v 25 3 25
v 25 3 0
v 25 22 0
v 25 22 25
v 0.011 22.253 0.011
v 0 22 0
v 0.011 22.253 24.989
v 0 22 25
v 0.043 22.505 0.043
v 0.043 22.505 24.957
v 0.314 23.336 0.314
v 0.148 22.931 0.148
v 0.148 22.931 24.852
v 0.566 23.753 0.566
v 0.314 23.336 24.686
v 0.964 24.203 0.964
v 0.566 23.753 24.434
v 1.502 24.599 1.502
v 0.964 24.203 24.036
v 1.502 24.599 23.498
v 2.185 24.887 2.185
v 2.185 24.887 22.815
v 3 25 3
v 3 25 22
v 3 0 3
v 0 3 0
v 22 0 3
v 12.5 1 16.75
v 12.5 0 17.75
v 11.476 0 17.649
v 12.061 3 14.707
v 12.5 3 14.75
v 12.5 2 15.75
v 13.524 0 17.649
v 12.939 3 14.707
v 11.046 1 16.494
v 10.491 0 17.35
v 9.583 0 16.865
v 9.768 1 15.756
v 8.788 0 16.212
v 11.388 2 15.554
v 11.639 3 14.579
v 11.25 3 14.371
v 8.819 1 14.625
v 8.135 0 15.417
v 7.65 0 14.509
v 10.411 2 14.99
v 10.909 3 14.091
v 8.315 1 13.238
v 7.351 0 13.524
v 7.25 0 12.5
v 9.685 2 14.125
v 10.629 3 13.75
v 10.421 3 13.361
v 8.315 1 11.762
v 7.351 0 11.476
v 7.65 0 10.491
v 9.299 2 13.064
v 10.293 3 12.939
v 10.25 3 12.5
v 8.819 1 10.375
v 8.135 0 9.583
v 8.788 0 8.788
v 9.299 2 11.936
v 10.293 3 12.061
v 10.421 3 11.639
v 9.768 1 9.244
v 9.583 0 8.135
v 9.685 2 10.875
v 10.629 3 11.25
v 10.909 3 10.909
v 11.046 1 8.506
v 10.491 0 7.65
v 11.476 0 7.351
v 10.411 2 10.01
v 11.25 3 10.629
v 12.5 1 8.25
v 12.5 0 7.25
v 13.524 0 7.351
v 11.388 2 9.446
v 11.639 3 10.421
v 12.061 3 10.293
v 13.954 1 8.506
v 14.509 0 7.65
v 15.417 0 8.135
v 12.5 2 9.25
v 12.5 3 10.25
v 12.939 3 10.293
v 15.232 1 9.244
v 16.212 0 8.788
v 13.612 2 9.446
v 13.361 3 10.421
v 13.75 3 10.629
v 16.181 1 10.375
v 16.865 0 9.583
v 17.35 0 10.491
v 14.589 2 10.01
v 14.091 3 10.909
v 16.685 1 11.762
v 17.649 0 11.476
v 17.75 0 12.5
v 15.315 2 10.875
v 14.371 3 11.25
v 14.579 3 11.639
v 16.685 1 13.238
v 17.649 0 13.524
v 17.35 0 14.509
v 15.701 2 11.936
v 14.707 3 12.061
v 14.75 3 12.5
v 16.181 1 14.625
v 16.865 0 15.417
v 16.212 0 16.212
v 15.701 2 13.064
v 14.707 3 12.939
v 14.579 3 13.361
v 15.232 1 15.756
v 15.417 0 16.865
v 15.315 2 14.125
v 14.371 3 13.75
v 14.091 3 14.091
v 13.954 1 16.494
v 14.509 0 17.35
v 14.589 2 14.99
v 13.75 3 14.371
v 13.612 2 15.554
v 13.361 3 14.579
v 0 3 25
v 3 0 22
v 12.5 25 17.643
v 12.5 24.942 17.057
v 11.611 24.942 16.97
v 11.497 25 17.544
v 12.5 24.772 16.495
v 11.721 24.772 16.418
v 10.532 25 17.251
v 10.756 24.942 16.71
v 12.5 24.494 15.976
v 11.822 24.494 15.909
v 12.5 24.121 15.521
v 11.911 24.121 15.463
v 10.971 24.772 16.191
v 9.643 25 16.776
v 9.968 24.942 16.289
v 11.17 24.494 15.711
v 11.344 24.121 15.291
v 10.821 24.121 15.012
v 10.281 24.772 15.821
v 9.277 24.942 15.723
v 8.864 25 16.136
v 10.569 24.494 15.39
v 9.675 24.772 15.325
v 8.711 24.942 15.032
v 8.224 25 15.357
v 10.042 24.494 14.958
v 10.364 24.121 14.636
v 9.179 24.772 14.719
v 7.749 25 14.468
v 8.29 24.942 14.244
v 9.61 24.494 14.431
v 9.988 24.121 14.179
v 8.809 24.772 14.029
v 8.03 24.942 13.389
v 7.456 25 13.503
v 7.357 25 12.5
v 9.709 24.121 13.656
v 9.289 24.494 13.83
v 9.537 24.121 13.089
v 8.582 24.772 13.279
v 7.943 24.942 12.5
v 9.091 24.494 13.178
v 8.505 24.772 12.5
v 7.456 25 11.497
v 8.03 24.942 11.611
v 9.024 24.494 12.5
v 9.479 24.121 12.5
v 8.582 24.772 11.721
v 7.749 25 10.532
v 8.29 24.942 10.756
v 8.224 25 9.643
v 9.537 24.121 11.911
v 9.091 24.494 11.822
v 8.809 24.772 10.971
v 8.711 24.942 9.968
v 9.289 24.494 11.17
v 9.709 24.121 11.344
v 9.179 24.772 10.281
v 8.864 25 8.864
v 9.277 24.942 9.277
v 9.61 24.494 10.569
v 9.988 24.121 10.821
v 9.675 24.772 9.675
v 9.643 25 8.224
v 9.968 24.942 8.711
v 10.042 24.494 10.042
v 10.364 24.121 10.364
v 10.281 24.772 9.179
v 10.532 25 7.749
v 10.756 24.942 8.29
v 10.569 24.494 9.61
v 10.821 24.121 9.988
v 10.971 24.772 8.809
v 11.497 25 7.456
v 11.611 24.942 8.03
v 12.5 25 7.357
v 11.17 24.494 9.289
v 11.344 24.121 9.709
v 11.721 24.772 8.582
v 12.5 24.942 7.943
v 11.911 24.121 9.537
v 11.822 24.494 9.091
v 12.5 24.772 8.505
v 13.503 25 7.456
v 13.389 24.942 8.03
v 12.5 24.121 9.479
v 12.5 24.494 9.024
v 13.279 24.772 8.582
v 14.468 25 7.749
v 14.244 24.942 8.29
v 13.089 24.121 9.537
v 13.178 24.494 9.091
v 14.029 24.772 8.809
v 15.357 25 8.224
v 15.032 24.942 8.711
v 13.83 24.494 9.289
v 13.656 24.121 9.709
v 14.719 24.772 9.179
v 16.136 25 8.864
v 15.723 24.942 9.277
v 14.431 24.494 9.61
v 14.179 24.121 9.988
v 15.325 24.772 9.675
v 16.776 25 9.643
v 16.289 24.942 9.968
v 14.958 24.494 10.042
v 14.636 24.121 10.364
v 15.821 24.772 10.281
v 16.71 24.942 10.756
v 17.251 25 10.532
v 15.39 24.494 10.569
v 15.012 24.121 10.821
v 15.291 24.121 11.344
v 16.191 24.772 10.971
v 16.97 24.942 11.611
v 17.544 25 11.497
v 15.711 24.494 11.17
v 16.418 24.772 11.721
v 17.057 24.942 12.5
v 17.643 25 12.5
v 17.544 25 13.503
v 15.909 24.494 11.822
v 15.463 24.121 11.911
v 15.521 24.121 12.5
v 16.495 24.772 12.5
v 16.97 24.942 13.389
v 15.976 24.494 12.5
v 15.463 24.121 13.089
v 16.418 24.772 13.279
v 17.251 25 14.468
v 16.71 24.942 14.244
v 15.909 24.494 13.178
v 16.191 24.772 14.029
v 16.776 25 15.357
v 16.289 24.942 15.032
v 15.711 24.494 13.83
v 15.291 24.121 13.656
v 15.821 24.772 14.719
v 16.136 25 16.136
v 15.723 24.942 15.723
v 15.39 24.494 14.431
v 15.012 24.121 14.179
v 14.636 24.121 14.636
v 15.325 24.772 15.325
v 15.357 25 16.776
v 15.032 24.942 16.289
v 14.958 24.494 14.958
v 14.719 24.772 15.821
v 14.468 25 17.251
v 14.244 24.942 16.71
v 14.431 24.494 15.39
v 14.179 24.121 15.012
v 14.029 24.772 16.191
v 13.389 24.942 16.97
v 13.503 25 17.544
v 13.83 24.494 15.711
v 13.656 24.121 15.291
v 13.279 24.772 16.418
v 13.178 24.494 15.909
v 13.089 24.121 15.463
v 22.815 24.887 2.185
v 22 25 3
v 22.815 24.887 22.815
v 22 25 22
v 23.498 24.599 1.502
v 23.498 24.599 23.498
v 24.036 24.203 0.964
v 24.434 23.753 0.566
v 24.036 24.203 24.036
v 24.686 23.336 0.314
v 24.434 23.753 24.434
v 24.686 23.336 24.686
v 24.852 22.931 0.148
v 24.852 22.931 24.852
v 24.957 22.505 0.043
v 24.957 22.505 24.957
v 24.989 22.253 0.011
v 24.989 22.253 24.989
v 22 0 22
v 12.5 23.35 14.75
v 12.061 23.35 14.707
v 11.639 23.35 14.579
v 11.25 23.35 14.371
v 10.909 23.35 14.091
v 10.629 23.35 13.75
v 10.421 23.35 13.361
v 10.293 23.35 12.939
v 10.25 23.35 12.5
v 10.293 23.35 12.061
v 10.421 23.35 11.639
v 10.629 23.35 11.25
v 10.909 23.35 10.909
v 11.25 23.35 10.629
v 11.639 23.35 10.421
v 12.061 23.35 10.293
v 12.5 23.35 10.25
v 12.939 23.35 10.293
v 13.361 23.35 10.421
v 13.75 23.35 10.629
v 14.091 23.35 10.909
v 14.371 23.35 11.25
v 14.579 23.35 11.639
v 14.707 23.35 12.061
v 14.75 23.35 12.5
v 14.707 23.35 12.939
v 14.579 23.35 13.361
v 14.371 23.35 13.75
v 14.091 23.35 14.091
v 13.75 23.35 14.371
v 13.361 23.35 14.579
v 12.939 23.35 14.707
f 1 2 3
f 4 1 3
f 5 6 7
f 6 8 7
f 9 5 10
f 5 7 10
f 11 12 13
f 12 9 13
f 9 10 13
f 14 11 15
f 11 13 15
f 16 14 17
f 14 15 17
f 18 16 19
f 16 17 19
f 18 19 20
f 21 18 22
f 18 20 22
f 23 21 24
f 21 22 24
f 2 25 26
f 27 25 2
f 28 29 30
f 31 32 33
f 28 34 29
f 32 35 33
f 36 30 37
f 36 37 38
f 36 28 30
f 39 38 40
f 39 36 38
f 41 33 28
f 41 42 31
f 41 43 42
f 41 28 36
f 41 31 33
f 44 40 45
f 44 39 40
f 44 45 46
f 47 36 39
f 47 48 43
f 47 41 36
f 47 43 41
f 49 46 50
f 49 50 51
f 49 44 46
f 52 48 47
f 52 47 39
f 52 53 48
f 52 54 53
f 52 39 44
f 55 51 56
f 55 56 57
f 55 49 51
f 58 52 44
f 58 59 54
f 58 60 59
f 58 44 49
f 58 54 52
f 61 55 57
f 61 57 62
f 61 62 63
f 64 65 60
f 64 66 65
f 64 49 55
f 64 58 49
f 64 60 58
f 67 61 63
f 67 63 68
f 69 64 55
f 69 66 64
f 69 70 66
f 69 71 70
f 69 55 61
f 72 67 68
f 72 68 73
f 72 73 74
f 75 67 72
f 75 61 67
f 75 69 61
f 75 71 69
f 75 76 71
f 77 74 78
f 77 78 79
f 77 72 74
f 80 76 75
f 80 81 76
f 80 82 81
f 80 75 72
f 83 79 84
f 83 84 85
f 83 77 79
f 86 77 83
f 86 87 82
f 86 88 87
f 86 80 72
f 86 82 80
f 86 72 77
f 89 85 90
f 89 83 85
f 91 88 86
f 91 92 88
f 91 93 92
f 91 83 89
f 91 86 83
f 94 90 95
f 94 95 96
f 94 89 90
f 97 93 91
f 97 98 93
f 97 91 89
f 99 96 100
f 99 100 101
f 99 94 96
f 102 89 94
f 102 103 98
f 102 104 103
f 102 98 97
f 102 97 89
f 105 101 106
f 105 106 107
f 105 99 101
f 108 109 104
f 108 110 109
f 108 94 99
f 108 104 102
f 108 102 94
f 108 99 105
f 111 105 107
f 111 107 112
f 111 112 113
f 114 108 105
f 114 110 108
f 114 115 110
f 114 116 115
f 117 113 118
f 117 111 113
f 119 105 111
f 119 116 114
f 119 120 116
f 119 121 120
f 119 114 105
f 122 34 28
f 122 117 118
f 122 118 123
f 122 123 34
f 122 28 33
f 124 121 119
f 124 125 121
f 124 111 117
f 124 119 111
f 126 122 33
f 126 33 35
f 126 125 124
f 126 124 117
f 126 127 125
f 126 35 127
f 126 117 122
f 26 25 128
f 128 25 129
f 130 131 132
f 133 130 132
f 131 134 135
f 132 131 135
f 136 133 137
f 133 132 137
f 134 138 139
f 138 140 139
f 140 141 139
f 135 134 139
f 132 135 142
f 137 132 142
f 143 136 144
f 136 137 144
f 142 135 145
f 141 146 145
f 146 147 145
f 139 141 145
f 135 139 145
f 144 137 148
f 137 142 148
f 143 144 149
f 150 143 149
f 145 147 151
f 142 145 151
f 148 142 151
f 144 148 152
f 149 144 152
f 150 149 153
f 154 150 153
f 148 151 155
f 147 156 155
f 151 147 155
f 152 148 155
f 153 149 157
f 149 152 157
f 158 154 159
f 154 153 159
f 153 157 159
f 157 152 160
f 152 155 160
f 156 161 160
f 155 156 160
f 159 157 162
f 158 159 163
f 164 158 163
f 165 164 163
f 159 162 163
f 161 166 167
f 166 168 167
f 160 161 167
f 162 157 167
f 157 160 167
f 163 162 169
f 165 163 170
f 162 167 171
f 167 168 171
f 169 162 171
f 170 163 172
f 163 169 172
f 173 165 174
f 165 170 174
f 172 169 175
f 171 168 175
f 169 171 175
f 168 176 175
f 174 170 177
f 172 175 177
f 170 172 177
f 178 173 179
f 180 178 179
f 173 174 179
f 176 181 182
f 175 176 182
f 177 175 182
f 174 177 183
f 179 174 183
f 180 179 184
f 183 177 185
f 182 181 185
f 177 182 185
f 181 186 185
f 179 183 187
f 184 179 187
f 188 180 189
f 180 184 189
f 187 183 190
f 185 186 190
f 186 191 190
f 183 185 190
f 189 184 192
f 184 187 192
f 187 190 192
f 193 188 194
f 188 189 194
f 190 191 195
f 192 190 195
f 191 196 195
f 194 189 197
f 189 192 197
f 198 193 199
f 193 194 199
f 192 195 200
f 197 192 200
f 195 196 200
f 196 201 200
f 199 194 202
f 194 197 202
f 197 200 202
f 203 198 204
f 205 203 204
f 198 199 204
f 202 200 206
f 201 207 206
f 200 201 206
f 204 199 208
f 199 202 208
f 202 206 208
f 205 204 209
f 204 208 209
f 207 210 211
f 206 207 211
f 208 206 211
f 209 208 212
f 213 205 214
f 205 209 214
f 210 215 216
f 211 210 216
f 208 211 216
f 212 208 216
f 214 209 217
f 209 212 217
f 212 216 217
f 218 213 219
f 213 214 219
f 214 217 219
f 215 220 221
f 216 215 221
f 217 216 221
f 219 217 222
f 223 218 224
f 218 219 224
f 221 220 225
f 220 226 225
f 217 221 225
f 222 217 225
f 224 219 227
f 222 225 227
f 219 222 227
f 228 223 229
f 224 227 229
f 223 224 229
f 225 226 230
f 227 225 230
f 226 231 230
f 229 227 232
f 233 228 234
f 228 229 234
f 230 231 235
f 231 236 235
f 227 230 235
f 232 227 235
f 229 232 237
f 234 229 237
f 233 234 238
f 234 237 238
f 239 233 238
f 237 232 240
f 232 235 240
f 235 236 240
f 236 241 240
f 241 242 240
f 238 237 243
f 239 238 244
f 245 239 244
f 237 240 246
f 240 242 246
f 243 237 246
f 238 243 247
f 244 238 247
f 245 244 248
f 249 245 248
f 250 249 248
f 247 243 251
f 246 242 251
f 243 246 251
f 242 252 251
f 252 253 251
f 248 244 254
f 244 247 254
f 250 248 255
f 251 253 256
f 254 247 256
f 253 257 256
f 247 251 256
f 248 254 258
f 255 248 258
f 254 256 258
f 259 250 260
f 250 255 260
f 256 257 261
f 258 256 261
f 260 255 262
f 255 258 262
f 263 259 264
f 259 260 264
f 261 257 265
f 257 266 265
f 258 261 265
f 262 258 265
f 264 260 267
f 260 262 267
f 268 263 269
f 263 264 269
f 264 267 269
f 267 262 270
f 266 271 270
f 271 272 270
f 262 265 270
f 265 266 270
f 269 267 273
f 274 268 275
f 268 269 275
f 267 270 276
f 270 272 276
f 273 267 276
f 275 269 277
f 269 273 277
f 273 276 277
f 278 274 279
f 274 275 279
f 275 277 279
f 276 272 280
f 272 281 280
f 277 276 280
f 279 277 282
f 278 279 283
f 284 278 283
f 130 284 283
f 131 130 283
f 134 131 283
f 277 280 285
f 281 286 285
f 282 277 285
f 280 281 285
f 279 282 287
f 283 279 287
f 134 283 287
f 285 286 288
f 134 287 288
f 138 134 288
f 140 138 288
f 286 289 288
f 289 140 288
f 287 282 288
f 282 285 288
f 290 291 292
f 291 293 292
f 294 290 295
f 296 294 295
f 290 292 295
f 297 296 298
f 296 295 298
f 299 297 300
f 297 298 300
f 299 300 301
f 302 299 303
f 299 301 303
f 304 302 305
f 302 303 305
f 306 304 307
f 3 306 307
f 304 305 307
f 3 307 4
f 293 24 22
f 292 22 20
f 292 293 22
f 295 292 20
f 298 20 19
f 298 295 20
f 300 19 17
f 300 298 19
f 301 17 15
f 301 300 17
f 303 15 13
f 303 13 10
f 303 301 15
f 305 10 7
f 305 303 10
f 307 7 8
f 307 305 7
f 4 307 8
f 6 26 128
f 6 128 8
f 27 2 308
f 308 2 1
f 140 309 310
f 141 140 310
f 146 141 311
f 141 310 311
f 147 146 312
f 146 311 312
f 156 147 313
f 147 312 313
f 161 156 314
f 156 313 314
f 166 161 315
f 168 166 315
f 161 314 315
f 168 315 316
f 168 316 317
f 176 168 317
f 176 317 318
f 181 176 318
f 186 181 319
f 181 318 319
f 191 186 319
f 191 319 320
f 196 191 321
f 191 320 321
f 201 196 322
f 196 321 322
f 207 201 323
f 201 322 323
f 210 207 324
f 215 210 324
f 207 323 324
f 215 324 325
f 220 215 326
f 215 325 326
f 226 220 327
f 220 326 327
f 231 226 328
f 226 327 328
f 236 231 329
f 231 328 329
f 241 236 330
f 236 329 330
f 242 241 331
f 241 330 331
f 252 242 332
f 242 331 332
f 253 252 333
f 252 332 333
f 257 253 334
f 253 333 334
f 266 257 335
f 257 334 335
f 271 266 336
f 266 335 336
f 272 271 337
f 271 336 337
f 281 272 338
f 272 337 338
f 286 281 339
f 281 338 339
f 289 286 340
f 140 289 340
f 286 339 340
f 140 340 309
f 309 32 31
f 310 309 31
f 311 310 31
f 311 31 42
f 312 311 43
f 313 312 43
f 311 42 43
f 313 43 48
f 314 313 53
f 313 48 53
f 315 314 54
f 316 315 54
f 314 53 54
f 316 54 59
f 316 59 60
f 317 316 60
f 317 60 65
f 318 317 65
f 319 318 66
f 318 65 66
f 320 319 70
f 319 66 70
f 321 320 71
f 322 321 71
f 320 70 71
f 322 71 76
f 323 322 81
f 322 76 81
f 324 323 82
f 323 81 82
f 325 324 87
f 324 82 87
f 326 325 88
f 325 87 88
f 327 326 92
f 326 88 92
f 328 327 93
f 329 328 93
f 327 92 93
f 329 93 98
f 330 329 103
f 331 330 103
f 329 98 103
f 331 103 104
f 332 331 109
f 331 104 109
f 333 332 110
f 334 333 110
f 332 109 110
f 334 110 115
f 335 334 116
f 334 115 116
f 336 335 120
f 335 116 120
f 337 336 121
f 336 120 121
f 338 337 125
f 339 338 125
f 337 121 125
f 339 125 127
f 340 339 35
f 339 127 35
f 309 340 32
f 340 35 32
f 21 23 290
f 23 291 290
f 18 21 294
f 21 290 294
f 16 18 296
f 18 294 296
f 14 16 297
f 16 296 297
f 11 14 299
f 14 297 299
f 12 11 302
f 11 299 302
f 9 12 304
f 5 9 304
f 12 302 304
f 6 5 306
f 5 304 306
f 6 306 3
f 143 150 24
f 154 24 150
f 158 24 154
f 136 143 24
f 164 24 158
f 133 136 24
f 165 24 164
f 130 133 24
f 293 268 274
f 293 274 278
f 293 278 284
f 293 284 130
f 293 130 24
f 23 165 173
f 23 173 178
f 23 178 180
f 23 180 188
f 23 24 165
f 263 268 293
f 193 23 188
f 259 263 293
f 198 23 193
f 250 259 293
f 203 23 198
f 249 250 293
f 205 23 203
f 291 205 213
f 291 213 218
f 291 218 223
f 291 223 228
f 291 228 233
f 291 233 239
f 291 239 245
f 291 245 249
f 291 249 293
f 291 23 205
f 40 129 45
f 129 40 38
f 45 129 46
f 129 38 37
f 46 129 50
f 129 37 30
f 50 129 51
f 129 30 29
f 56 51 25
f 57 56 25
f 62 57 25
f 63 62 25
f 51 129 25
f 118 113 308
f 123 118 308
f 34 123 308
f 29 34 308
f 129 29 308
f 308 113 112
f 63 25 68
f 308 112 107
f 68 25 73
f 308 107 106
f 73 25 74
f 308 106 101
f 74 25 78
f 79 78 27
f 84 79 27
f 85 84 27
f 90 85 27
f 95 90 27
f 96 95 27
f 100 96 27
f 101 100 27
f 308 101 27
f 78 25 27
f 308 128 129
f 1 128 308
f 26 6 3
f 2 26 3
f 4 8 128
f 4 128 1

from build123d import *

# Parameters (mm, degrees)
SKETCH_1_W      = 25
SKETCH_1_H      = 25
EXTRUDE_1_DEPTH = 25
FILLET_1_R      = 3
CHAMFER_1_SIZE  = 3


with BuildPart() as part:
    # 草图1 → 凸台-拉伸1 (new body)
    with BuildSketch(Plane.XY):
        with Locations((12.5, 12.5)):
            Rectangle(SKETCH_1_W, SKETCH_1_H)
    extrude(amount=EXTRUDE_1_DEPTH)

    # 草图3 → 切除-旋转1 (revolve, cut)
    with BuildSketch(Plane.XY.offset(12.5), mode=Mode.PRIVATE) as cut_revolve_1_sk:
        Polygon((10.25, 23.35), (10.25, 0), (12.5, 0), (12.5, 25), (8.6, 25), align=None)
    revolve(cut_revolve_1_sk.sketch.rotate(Axis((12.5, 25, 12.5), (0, -1, 0)), 270), axis=Axis((12.5, 25, 12.5), (0, -1, 0)), mode=Mode.SUBTRACT)

    # 圆角1
    fillet_1_edges = [part.edges().sort_by_distance(p)[0] for p in [
        (12.5, 25, 25),
        (12.5, 25, 8.6),
        (12.5, 25, 0),
        (0, 25, 12.5),
        (25, 25, 12.5),
    ]]
    fillet(fillet_1_edges, radius=FILLET_1_R)

    # 倒角1
    chamfer_1_edges = [part.edges().sort_by_distance(p)[0] for p in [
        (12.5, 0, 10.25),
        (12.5, 0, 0),
        (25, 0, 12.5),
        (0, 0, 12.5),
        (12.5, 0, 25),
    ]]
    chamfer(chamfer_1_edges, length=CHAMFER_1_SIZE)


solid = part.part
